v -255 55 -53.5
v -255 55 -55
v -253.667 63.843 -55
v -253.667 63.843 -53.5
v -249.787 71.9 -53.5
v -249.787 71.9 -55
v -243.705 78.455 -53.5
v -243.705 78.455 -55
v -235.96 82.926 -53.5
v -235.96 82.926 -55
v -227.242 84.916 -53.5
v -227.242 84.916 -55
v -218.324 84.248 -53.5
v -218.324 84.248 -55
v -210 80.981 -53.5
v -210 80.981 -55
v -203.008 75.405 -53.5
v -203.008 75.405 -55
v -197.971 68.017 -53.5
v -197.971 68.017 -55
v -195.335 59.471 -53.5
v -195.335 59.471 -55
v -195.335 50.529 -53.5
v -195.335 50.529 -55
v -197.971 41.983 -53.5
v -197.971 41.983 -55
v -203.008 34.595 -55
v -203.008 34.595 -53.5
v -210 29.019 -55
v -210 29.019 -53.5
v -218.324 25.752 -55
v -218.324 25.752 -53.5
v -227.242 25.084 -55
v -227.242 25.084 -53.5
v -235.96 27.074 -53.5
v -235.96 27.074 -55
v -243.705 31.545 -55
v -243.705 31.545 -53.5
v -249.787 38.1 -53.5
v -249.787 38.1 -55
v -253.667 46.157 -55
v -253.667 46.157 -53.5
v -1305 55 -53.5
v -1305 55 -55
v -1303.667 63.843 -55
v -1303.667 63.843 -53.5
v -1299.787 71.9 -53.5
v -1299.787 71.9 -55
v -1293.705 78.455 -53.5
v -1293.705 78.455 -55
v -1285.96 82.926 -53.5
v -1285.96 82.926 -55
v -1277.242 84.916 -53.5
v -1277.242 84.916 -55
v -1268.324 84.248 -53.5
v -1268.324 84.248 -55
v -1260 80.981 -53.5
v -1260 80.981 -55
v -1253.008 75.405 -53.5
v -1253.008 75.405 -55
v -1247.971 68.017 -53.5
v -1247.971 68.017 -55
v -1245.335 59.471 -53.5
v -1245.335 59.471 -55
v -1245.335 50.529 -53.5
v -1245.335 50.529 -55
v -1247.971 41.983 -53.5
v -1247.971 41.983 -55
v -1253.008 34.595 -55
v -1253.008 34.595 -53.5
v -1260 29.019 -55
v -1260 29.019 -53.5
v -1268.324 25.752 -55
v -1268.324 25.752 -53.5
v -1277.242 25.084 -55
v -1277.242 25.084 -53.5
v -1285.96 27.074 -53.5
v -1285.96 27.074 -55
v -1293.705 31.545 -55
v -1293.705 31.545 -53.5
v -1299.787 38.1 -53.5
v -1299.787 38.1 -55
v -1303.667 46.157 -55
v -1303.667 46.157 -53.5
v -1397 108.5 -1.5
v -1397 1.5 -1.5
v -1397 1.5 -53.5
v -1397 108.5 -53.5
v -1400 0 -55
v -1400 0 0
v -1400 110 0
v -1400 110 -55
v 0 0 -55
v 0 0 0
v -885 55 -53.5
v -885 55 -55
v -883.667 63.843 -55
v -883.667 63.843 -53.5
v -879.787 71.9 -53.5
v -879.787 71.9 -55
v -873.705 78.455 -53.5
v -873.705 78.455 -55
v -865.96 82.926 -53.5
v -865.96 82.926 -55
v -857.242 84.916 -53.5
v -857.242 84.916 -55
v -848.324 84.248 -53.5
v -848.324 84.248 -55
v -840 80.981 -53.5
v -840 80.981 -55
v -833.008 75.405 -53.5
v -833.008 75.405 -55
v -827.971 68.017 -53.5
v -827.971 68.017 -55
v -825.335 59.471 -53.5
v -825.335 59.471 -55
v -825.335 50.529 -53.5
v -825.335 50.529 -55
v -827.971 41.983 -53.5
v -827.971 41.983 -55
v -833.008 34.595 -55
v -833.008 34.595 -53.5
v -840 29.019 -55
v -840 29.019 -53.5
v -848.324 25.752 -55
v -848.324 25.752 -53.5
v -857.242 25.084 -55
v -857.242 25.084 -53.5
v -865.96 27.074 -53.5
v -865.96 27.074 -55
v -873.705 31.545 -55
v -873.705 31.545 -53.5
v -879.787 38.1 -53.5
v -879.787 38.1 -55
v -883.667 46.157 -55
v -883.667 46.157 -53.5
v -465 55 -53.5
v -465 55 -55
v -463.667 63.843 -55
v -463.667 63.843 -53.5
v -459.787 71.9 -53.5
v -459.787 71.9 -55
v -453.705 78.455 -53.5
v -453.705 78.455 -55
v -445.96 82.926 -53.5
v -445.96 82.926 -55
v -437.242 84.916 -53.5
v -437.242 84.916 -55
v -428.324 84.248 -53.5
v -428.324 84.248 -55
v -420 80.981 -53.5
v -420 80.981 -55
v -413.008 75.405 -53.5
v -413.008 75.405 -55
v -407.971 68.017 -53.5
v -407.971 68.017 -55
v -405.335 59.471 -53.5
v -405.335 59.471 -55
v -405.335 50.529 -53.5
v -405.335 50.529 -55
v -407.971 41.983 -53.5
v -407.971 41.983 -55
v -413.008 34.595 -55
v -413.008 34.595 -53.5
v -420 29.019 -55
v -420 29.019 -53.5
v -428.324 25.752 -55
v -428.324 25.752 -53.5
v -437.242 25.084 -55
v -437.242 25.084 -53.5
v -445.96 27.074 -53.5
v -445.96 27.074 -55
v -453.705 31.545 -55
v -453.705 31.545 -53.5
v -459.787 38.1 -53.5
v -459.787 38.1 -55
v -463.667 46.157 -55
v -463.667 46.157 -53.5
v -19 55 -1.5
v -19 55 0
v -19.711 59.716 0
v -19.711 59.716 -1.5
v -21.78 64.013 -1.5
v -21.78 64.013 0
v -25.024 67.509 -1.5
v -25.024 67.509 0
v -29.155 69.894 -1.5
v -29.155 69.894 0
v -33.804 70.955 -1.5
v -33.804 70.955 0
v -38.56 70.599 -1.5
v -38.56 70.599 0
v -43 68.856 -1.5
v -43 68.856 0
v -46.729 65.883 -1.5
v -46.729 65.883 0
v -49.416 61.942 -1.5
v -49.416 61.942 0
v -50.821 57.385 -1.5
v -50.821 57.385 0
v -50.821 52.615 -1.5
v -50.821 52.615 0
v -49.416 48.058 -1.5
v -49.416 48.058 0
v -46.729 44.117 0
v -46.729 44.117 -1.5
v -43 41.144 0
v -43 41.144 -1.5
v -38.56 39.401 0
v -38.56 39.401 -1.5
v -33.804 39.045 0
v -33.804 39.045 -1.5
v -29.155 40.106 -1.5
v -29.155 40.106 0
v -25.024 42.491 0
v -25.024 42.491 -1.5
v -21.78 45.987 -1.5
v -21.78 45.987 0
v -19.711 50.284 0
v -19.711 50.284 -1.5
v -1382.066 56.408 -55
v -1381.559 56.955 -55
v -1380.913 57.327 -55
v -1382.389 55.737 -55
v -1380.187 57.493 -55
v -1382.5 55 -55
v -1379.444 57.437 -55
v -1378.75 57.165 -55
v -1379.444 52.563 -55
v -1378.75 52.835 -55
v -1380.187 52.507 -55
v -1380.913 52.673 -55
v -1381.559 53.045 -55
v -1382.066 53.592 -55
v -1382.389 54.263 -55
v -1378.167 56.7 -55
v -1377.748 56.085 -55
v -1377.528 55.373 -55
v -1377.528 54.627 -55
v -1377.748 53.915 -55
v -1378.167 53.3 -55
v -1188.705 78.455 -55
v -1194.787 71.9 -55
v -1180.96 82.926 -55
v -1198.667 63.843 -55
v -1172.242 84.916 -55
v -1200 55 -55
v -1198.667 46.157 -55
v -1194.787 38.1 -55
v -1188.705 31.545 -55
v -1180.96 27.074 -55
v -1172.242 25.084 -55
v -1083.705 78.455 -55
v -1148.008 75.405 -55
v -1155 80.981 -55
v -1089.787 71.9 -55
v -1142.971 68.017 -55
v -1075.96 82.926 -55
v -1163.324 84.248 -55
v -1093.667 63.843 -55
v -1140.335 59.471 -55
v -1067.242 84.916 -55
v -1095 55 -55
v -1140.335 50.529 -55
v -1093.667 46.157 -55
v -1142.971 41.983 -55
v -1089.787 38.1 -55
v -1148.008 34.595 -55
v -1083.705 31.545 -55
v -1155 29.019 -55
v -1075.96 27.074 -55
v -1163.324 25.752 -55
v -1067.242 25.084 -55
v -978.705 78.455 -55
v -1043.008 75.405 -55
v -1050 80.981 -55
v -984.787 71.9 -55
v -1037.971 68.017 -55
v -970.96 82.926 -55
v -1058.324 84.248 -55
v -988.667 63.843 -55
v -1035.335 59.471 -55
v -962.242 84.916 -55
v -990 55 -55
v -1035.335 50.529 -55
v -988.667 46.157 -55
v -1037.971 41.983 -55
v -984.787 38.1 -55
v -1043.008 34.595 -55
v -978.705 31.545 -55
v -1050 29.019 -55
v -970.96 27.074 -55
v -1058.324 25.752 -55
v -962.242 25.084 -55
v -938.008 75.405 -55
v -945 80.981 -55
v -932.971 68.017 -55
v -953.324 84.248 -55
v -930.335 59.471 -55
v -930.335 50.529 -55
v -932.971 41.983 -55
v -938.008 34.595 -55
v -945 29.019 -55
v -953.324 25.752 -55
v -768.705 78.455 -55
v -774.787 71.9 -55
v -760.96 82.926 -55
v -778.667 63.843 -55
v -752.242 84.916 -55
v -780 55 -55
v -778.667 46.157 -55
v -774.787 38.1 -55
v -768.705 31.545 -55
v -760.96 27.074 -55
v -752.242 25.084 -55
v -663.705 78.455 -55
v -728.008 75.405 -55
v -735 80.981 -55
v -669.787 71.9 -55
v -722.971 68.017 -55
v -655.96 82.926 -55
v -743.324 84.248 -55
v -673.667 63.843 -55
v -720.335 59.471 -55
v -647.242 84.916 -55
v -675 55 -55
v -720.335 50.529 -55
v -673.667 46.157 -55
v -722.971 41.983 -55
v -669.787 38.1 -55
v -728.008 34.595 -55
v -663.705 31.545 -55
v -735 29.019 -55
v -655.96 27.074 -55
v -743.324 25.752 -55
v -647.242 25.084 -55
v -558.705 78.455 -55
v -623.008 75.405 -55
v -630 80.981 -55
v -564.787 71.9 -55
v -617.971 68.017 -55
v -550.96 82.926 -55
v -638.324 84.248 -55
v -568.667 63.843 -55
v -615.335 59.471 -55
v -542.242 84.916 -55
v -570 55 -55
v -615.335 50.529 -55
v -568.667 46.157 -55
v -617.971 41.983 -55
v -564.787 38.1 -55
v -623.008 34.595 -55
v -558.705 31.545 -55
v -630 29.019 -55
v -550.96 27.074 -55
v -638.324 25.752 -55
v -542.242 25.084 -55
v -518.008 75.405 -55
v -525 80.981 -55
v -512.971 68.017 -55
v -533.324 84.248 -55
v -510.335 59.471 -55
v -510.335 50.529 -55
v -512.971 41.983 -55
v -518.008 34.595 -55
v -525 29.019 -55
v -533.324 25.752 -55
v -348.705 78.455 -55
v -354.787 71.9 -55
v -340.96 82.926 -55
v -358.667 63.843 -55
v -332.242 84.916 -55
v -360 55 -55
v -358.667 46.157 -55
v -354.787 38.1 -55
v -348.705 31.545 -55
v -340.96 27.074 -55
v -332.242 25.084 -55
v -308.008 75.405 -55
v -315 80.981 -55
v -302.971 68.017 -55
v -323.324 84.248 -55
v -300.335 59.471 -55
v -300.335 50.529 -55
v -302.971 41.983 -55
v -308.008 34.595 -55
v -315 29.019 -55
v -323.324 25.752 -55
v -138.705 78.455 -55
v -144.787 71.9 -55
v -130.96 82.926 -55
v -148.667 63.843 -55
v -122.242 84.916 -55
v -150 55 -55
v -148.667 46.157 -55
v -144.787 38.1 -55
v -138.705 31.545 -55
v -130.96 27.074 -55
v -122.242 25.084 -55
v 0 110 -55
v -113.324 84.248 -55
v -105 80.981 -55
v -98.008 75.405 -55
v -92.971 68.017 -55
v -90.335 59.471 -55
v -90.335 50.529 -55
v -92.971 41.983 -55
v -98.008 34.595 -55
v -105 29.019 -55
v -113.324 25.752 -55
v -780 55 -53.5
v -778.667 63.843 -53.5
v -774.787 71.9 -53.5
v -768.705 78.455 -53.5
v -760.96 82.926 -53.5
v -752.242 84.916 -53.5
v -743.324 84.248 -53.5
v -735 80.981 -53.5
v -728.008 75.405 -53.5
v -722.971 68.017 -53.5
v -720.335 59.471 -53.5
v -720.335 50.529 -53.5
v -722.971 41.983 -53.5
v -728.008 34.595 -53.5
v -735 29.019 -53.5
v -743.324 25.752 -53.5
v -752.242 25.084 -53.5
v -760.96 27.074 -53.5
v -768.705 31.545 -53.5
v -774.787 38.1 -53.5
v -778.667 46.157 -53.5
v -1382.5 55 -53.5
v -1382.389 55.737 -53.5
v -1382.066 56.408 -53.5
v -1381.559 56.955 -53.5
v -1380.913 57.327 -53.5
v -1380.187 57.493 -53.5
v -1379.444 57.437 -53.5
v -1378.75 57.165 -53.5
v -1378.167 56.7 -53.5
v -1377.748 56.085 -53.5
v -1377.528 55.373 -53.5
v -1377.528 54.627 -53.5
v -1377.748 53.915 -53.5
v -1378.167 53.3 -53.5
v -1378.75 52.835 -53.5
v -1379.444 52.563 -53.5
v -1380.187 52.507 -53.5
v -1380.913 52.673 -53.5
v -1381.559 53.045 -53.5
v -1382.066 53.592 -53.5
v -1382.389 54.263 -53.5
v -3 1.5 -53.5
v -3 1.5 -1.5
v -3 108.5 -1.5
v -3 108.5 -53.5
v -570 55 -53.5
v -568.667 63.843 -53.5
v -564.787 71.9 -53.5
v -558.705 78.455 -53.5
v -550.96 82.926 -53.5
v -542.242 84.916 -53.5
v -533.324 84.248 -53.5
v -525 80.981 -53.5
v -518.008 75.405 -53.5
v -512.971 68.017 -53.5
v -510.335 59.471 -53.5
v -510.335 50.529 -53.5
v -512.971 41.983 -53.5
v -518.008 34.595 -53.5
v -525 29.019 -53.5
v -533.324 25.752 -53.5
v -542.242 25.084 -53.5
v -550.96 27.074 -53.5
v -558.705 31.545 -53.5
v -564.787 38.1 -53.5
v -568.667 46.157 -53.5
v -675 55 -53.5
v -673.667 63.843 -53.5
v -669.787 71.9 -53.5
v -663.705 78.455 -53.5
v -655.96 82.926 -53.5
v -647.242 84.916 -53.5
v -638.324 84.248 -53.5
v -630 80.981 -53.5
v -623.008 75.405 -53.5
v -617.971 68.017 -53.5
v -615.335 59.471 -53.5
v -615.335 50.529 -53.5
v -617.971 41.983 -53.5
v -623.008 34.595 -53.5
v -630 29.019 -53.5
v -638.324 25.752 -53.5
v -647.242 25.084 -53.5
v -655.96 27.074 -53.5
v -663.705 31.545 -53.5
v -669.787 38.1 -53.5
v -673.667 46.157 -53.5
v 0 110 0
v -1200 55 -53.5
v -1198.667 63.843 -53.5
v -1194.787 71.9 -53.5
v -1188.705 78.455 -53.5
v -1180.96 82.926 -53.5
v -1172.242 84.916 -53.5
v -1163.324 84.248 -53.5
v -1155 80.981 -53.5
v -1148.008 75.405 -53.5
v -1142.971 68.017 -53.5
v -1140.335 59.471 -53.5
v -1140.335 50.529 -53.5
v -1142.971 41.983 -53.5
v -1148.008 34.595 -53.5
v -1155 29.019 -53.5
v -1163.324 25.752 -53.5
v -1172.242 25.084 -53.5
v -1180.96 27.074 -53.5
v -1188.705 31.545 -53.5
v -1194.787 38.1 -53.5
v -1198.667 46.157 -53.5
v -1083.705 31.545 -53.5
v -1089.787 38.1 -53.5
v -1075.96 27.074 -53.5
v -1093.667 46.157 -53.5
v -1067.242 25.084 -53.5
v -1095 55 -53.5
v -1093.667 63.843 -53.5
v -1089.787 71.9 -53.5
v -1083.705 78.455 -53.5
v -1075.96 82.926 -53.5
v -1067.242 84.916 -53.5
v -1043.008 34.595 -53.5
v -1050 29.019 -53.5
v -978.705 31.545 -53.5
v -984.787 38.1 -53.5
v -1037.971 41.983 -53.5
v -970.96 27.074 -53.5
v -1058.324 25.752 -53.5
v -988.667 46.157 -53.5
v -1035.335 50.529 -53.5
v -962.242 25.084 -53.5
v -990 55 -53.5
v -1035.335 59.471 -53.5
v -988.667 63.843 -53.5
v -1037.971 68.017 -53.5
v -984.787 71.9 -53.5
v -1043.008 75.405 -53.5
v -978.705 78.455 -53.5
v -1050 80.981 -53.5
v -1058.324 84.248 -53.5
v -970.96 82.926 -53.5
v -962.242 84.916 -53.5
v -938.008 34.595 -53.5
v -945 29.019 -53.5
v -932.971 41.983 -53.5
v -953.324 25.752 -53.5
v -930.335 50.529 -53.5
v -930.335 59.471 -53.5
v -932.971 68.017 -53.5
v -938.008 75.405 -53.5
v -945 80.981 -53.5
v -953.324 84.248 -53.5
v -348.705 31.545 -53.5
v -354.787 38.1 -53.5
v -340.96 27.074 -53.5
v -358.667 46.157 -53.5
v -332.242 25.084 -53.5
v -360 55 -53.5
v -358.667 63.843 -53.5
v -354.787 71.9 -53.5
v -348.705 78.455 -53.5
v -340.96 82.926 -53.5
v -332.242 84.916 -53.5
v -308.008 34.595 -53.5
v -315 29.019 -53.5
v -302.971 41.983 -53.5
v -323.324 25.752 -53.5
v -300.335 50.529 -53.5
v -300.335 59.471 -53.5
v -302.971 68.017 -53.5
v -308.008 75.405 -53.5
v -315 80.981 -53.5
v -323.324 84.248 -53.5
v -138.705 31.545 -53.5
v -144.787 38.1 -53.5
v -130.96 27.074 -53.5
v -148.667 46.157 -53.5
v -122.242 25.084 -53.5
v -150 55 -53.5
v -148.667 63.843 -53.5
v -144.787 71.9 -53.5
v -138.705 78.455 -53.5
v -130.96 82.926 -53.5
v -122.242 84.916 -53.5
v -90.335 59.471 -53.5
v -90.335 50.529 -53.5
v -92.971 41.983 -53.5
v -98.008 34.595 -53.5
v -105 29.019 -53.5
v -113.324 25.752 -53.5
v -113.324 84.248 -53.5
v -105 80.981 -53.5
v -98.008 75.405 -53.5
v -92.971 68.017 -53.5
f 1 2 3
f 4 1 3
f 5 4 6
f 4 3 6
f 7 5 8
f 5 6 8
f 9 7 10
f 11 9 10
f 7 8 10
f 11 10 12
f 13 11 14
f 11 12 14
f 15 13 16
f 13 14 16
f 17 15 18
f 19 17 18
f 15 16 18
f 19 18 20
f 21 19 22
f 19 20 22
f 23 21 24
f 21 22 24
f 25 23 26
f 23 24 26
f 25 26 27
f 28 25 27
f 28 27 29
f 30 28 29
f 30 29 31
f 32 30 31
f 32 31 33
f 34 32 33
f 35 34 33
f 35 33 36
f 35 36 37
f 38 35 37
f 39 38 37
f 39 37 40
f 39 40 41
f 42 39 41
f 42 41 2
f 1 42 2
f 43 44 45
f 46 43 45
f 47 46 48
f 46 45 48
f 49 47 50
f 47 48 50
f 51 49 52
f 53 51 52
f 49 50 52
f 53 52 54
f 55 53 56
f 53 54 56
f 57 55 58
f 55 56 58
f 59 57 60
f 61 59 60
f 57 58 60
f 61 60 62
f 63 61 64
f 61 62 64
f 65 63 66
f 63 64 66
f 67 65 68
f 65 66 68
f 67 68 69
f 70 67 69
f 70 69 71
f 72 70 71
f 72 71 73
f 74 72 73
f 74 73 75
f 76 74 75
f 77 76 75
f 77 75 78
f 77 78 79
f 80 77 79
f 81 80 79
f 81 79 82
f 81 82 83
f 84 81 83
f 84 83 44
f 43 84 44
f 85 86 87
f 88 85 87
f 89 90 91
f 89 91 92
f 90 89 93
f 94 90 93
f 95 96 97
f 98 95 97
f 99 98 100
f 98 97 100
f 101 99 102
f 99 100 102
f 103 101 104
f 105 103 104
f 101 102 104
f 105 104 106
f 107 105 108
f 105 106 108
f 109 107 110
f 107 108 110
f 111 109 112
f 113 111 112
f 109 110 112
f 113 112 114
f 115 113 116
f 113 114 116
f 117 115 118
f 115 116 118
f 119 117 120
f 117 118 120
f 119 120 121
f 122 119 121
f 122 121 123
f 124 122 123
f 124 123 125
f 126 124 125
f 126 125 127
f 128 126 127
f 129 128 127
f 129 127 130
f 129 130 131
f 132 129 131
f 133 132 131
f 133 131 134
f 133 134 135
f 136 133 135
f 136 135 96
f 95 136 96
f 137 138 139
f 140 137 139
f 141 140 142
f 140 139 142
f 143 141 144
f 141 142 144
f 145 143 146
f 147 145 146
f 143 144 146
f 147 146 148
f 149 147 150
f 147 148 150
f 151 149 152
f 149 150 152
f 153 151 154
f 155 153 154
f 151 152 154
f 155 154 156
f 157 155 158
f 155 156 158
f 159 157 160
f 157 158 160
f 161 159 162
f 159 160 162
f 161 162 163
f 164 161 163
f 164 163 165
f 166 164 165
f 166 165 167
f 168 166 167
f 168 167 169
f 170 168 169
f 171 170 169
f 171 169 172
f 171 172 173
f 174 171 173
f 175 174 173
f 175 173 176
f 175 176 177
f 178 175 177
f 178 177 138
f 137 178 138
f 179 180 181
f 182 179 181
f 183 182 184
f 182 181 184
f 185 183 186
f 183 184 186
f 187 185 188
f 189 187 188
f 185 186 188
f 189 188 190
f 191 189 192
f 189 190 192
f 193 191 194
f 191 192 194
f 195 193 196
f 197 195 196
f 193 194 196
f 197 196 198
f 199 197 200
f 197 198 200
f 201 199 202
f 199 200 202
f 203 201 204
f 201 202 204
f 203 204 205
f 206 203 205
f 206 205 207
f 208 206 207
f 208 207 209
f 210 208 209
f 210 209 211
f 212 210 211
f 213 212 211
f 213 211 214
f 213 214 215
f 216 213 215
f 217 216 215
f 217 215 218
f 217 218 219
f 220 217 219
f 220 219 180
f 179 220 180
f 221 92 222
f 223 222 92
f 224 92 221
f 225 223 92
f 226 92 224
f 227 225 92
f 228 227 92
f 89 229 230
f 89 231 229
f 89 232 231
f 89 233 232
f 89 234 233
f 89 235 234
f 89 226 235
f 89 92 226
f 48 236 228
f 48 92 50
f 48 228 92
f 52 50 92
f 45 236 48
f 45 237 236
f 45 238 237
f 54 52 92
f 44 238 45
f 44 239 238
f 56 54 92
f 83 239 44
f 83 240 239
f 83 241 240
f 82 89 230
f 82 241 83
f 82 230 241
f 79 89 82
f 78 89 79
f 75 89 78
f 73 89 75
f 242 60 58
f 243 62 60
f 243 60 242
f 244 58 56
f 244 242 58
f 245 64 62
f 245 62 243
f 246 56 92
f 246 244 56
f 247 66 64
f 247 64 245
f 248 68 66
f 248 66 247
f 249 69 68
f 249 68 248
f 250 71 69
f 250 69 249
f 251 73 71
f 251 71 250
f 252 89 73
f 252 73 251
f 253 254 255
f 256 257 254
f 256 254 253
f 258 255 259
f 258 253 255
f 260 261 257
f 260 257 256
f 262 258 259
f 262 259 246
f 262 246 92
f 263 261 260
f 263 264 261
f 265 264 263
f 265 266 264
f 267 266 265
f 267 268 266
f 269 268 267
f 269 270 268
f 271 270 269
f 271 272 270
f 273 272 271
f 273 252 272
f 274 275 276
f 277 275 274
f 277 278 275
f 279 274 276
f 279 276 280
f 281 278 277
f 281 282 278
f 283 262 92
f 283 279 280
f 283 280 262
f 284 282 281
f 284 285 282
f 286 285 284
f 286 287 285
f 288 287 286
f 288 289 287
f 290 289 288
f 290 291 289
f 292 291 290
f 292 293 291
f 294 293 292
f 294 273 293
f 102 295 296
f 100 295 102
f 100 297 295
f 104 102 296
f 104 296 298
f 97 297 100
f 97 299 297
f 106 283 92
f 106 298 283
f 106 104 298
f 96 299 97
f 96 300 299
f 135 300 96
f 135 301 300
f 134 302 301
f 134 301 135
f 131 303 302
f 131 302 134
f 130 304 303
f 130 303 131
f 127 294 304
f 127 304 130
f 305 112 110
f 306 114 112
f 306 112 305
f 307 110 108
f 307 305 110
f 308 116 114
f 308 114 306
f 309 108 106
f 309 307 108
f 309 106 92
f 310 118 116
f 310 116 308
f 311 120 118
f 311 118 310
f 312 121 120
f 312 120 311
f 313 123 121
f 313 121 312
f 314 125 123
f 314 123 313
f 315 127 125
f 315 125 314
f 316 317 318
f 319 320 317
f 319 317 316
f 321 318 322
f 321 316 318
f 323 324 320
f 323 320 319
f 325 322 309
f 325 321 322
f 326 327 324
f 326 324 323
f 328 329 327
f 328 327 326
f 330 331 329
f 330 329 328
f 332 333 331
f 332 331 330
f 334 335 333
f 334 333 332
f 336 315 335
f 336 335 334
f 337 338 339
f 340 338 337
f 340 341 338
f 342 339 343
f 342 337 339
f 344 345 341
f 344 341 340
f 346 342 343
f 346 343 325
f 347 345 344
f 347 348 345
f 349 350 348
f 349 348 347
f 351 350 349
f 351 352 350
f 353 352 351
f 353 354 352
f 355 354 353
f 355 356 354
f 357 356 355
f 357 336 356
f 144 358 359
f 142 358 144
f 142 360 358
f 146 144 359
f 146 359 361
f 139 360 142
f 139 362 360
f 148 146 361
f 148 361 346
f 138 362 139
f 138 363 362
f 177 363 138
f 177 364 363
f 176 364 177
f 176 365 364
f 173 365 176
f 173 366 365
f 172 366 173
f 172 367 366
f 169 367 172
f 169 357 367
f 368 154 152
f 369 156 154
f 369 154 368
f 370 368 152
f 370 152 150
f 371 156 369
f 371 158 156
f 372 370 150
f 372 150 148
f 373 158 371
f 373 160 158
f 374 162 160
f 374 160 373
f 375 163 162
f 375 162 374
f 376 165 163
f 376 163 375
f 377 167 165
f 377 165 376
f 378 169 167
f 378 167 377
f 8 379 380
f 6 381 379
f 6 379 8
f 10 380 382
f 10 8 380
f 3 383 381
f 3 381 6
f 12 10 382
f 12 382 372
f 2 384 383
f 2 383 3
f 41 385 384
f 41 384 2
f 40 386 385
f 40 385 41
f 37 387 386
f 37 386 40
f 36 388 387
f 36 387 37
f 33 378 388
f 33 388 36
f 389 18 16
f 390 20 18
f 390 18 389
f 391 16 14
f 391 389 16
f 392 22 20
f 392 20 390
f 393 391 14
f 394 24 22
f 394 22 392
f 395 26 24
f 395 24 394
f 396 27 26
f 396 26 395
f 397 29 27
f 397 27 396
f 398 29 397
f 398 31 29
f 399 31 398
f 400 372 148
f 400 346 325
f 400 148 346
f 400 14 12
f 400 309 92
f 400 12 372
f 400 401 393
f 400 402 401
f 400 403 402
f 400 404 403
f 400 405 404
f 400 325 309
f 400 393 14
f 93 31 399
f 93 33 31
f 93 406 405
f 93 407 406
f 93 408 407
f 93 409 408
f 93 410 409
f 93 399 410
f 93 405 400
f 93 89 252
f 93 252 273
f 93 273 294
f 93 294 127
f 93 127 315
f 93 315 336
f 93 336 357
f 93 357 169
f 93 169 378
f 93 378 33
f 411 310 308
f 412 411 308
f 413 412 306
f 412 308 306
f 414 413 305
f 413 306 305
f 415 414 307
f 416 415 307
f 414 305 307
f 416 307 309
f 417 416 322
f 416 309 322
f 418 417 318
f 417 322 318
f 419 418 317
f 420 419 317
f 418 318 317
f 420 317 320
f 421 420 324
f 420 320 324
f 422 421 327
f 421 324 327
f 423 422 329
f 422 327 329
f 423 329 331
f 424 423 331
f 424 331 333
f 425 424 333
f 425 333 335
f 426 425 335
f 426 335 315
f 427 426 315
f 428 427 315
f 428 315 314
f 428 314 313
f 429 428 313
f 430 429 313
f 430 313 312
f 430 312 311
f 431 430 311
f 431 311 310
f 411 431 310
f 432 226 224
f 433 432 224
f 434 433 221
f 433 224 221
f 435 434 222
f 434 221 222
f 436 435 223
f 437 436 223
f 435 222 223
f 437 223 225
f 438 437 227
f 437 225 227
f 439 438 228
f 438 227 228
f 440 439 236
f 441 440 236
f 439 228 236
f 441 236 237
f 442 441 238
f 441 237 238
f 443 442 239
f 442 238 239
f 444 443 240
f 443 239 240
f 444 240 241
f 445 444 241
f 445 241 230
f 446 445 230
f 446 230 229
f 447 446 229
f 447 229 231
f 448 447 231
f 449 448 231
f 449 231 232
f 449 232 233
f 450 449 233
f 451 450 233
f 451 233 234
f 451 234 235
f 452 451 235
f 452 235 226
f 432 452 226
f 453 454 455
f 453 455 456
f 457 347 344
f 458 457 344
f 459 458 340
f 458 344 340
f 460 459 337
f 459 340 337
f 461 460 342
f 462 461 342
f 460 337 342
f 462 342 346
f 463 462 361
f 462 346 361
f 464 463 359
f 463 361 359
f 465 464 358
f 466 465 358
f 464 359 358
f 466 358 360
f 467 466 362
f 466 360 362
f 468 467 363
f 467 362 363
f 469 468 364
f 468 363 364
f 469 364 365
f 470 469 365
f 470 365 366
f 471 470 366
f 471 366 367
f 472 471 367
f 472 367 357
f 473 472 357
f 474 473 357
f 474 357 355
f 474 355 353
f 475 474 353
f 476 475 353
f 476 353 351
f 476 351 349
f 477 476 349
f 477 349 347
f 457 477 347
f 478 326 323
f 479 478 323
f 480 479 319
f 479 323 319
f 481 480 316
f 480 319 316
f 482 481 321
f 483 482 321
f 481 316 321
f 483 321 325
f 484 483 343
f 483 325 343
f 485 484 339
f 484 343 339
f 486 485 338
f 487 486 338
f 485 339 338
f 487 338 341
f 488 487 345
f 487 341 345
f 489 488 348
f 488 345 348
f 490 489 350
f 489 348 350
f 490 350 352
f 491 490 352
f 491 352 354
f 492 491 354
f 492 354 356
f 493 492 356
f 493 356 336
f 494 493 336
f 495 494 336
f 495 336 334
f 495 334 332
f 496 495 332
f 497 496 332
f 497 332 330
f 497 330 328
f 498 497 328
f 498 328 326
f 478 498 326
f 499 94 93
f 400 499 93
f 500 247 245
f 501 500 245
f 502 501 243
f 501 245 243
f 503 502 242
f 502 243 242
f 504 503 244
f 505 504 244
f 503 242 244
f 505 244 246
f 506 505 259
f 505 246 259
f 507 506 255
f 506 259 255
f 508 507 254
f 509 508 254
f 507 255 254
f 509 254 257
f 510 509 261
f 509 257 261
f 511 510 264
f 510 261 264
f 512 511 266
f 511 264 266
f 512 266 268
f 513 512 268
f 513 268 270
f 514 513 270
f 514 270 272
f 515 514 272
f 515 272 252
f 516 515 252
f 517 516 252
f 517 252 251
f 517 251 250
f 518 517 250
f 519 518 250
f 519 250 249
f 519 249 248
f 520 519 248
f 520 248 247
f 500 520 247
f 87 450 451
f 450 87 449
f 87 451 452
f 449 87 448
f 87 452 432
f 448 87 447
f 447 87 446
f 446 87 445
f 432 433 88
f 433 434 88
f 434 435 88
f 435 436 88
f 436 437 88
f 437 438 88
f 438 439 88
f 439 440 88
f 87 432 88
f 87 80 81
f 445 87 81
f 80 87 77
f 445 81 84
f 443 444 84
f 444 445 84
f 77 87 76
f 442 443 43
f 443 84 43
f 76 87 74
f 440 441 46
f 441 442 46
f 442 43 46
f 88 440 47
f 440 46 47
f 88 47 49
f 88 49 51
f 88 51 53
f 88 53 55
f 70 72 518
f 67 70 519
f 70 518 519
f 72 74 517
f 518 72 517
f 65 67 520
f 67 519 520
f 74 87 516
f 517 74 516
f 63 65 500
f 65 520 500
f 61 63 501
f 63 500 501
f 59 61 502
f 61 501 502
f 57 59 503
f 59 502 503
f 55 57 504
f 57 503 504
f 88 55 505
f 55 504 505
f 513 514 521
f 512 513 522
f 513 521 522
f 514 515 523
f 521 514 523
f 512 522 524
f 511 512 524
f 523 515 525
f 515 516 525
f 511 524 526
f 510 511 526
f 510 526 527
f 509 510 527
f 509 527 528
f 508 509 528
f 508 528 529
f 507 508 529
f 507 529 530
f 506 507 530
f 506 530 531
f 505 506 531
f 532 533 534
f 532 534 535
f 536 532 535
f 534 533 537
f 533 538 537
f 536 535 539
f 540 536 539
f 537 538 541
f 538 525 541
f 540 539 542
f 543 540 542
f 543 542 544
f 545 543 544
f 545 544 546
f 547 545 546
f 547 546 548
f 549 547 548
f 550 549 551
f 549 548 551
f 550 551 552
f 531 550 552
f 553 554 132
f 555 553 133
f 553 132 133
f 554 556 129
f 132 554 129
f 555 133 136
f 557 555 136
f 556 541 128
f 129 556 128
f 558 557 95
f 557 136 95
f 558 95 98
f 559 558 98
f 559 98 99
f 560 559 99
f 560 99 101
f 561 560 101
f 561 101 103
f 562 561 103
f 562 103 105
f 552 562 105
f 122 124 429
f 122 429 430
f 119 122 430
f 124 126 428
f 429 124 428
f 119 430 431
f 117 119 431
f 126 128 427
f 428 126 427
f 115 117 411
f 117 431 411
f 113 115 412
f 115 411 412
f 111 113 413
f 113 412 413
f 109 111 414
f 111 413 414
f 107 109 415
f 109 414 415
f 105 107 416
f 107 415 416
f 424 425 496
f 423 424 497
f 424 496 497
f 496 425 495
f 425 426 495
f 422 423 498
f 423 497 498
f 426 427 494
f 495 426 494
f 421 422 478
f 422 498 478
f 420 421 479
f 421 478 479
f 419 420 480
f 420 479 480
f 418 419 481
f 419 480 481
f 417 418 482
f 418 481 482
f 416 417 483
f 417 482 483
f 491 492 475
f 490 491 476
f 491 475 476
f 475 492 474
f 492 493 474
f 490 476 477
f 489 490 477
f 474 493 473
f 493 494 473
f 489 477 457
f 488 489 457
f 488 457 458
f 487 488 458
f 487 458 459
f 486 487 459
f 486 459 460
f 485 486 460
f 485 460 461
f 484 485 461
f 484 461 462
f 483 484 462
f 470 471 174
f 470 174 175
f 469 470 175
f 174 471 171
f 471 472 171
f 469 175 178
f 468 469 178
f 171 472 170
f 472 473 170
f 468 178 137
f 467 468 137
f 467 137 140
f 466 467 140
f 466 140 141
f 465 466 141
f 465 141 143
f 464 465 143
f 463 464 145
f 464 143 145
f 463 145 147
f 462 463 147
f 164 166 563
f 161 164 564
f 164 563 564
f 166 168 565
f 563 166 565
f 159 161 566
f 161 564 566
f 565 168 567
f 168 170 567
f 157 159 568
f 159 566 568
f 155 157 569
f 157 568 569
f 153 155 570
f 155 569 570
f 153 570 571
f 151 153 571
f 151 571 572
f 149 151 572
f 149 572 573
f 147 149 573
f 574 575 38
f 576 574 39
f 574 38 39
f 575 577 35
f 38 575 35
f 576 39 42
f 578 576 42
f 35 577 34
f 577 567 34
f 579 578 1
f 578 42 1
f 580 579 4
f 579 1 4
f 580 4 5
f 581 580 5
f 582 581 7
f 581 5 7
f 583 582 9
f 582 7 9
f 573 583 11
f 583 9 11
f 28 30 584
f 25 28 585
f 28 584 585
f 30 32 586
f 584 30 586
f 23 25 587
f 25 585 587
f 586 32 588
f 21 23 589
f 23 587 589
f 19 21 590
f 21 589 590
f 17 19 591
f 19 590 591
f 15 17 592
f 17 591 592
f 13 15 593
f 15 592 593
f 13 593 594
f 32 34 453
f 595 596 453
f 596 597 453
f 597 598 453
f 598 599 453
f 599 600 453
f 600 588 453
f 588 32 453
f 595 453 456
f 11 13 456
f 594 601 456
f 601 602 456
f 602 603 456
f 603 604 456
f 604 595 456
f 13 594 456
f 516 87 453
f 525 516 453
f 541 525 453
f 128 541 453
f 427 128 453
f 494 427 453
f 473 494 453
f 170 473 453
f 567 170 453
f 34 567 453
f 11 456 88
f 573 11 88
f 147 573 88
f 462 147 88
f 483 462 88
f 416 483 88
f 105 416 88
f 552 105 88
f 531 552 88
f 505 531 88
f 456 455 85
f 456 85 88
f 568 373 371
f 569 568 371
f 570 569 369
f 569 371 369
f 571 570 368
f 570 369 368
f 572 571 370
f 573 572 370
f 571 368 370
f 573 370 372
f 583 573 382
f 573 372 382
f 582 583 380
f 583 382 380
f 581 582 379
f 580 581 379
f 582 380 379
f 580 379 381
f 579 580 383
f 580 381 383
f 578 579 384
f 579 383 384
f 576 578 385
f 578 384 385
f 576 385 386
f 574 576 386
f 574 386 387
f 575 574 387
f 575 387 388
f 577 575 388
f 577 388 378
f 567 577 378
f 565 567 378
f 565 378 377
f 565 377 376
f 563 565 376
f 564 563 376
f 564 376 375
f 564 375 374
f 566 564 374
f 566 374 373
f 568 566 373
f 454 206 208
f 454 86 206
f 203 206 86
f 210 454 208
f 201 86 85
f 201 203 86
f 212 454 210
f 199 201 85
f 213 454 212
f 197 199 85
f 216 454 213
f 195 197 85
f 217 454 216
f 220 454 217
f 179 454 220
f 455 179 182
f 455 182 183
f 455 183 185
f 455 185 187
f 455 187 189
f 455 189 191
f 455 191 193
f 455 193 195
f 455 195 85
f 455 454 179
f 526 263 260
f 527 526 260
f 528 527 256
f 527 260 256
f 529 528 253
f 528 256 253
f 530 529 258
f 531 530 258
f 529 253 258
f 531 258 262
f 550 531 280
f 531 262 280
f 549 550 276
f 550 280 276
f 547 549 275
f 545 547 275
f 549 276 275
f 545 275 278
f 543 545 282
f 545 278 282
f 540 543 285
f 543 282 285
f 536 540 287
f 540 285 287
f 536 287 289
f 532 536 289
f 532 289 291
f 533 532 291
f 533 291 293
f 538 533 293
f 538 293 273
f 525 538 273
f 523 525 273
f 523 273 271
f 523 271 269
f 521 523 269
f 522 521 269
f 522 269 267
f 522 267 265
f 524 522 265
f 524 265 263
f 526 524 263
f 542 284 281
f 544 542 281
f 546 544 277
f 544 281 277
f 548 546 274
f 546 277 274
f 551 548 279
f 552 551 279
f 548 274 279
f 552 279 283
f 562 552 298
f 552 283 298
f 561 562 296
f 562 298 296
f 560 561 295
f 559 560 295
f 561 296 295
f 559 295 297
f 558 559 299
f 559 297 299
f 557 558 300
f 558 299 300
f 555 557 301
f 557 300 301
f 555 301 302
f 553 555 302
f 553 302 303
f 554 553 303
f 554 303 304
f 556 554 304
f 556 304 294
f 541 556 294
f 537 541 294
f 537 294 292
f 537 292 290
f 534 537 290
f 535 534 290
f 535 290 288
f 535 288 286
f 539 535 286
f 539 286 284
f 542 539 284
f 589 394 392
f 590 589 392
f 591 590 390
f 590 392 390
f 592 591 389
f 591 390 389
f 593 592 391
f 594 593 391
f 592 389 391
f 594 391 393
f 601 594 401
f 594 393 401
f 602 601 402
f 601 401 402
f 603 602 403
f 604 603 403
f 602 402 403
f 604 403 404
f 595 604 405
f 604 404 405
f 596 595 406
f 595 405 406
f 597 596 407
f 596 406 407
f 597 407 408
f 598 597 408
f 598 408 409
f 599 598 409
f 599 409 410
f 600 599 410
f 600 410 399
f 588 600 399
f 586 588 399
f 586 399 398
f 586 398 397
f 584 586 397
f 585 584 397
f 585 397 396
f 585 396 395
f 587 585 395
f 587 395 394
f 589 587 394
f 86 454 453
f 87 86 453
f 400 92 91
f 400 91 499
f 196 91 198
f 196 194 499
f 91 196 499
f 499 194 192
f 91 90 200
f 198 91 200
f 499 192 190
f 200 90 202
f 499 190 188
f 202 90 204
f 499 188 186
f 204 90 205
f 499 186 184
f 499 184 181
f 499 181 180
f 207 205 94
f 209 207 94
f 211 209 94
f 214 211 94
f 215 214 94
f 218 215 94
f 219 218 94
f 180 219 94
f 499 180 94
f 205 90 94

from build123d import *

# Parameters (mm, degrees)
SKETCH_1_W          = 1400
SKETCH_1_H          = 55
EXTRUDE_1_DEPTH     = 110
SKETCH_3_R          = 30
SKETCH_3_R_2        = 2.5
CUT_EXTRUDE_1_DEPTH = 10
CUT_EXTRUDE_START   = -3
SKETCH_4_W          = 52
SKETCH_4_H          = 107
CUT_EXTRUDE_2_DEPTH = 1394
SKETCH_5_R          = 16
CUT_EXTRUDE_3_DEPTH = 10


with BuildPart() as part:
    # Эскиз1 → Бобышка-Вытянуть1 (new body)
    with BuildSketch(Plane(origin=(0, 0, 0), x_dir=(1, 0, 0), z_dir=(0, 1, 0))):
        with Locations((-700, 27.5)):
            Rectangle(SKETCH_1_W, SKETCH_1_H)
    extrude(amount=EXTRUDE_1_DEPTH)

    # Эскиз3 → Вырез-Вытянуть1 (cut)
    with BuildSketch(Plane(origin=(0, 0, -55), x_dir=(-1, 0, 0), z_dir=(0, 0, -1))):
        with Locations((120, 55)):
            Circle(SKETCH_3_R)
        with Locations((225, 55)):
            Circle(SKETCH_3_R)
        with Locations((330, 55)):
            Circle(SKETCH_3_R)
        with Locations((435, 55)):
            Circle(SKETCH_3_R)
        with Locations((540, 55)):
            Circle(SKETCH_3_R)
        with Locations((645, 55)):
            Circle(SKETCH_3_R)
        with Locations((750, 55)):
            Circle(SKETCH_3_R)
        with Locations((855, 55)):
            Circle(SKETCH_3_R)
        with Locations((960, 55)):
            Circle(SKETCH_3_R)
        with Locations((1380, 55)):
            Circle(SKETCH_3_R_2)
        with Locations((1065, 55)):
            Circle(SKETCH_3_R)
        with Locations((1170, 55)):
            Circle(SKETCH_3_R)
        with Locations((1275, 55)):
            Circle(SKETCH_3_R)
    extrude(amount=-CUT_EXTRUDE_1_DEPTH, mode=Mode.SUBTRACT)

    # Эскиз4 → Вырез-Вытянуть2 (cut)
    with BuildSketch(Plane(origin=(0, 0, 0), x_dir=(0, 0, -1), z_dir=(1, 0, 0)).offset(CUT_EXTRUDE_START)):
        with Locations((27.5, 55)):
            Rectangle(SKETCH_4_W, SKETCH_4_H)
    extrude(amount=-CUT_EXTRUDE_2_DEPTH, mode=Mode.SUBTRACT)

    # Эскиз5 → Вырез-Вытянуть3 (cut)
    with BuildSketch(Plane.XY):
        with Locations((-35, 55)):
            Circle(SKETCH_5_R)
    extrude(amount=-CUT_EXTRUDE_3_DEPTH, mode=Mode.SUBTRACT)


solid = part.part
